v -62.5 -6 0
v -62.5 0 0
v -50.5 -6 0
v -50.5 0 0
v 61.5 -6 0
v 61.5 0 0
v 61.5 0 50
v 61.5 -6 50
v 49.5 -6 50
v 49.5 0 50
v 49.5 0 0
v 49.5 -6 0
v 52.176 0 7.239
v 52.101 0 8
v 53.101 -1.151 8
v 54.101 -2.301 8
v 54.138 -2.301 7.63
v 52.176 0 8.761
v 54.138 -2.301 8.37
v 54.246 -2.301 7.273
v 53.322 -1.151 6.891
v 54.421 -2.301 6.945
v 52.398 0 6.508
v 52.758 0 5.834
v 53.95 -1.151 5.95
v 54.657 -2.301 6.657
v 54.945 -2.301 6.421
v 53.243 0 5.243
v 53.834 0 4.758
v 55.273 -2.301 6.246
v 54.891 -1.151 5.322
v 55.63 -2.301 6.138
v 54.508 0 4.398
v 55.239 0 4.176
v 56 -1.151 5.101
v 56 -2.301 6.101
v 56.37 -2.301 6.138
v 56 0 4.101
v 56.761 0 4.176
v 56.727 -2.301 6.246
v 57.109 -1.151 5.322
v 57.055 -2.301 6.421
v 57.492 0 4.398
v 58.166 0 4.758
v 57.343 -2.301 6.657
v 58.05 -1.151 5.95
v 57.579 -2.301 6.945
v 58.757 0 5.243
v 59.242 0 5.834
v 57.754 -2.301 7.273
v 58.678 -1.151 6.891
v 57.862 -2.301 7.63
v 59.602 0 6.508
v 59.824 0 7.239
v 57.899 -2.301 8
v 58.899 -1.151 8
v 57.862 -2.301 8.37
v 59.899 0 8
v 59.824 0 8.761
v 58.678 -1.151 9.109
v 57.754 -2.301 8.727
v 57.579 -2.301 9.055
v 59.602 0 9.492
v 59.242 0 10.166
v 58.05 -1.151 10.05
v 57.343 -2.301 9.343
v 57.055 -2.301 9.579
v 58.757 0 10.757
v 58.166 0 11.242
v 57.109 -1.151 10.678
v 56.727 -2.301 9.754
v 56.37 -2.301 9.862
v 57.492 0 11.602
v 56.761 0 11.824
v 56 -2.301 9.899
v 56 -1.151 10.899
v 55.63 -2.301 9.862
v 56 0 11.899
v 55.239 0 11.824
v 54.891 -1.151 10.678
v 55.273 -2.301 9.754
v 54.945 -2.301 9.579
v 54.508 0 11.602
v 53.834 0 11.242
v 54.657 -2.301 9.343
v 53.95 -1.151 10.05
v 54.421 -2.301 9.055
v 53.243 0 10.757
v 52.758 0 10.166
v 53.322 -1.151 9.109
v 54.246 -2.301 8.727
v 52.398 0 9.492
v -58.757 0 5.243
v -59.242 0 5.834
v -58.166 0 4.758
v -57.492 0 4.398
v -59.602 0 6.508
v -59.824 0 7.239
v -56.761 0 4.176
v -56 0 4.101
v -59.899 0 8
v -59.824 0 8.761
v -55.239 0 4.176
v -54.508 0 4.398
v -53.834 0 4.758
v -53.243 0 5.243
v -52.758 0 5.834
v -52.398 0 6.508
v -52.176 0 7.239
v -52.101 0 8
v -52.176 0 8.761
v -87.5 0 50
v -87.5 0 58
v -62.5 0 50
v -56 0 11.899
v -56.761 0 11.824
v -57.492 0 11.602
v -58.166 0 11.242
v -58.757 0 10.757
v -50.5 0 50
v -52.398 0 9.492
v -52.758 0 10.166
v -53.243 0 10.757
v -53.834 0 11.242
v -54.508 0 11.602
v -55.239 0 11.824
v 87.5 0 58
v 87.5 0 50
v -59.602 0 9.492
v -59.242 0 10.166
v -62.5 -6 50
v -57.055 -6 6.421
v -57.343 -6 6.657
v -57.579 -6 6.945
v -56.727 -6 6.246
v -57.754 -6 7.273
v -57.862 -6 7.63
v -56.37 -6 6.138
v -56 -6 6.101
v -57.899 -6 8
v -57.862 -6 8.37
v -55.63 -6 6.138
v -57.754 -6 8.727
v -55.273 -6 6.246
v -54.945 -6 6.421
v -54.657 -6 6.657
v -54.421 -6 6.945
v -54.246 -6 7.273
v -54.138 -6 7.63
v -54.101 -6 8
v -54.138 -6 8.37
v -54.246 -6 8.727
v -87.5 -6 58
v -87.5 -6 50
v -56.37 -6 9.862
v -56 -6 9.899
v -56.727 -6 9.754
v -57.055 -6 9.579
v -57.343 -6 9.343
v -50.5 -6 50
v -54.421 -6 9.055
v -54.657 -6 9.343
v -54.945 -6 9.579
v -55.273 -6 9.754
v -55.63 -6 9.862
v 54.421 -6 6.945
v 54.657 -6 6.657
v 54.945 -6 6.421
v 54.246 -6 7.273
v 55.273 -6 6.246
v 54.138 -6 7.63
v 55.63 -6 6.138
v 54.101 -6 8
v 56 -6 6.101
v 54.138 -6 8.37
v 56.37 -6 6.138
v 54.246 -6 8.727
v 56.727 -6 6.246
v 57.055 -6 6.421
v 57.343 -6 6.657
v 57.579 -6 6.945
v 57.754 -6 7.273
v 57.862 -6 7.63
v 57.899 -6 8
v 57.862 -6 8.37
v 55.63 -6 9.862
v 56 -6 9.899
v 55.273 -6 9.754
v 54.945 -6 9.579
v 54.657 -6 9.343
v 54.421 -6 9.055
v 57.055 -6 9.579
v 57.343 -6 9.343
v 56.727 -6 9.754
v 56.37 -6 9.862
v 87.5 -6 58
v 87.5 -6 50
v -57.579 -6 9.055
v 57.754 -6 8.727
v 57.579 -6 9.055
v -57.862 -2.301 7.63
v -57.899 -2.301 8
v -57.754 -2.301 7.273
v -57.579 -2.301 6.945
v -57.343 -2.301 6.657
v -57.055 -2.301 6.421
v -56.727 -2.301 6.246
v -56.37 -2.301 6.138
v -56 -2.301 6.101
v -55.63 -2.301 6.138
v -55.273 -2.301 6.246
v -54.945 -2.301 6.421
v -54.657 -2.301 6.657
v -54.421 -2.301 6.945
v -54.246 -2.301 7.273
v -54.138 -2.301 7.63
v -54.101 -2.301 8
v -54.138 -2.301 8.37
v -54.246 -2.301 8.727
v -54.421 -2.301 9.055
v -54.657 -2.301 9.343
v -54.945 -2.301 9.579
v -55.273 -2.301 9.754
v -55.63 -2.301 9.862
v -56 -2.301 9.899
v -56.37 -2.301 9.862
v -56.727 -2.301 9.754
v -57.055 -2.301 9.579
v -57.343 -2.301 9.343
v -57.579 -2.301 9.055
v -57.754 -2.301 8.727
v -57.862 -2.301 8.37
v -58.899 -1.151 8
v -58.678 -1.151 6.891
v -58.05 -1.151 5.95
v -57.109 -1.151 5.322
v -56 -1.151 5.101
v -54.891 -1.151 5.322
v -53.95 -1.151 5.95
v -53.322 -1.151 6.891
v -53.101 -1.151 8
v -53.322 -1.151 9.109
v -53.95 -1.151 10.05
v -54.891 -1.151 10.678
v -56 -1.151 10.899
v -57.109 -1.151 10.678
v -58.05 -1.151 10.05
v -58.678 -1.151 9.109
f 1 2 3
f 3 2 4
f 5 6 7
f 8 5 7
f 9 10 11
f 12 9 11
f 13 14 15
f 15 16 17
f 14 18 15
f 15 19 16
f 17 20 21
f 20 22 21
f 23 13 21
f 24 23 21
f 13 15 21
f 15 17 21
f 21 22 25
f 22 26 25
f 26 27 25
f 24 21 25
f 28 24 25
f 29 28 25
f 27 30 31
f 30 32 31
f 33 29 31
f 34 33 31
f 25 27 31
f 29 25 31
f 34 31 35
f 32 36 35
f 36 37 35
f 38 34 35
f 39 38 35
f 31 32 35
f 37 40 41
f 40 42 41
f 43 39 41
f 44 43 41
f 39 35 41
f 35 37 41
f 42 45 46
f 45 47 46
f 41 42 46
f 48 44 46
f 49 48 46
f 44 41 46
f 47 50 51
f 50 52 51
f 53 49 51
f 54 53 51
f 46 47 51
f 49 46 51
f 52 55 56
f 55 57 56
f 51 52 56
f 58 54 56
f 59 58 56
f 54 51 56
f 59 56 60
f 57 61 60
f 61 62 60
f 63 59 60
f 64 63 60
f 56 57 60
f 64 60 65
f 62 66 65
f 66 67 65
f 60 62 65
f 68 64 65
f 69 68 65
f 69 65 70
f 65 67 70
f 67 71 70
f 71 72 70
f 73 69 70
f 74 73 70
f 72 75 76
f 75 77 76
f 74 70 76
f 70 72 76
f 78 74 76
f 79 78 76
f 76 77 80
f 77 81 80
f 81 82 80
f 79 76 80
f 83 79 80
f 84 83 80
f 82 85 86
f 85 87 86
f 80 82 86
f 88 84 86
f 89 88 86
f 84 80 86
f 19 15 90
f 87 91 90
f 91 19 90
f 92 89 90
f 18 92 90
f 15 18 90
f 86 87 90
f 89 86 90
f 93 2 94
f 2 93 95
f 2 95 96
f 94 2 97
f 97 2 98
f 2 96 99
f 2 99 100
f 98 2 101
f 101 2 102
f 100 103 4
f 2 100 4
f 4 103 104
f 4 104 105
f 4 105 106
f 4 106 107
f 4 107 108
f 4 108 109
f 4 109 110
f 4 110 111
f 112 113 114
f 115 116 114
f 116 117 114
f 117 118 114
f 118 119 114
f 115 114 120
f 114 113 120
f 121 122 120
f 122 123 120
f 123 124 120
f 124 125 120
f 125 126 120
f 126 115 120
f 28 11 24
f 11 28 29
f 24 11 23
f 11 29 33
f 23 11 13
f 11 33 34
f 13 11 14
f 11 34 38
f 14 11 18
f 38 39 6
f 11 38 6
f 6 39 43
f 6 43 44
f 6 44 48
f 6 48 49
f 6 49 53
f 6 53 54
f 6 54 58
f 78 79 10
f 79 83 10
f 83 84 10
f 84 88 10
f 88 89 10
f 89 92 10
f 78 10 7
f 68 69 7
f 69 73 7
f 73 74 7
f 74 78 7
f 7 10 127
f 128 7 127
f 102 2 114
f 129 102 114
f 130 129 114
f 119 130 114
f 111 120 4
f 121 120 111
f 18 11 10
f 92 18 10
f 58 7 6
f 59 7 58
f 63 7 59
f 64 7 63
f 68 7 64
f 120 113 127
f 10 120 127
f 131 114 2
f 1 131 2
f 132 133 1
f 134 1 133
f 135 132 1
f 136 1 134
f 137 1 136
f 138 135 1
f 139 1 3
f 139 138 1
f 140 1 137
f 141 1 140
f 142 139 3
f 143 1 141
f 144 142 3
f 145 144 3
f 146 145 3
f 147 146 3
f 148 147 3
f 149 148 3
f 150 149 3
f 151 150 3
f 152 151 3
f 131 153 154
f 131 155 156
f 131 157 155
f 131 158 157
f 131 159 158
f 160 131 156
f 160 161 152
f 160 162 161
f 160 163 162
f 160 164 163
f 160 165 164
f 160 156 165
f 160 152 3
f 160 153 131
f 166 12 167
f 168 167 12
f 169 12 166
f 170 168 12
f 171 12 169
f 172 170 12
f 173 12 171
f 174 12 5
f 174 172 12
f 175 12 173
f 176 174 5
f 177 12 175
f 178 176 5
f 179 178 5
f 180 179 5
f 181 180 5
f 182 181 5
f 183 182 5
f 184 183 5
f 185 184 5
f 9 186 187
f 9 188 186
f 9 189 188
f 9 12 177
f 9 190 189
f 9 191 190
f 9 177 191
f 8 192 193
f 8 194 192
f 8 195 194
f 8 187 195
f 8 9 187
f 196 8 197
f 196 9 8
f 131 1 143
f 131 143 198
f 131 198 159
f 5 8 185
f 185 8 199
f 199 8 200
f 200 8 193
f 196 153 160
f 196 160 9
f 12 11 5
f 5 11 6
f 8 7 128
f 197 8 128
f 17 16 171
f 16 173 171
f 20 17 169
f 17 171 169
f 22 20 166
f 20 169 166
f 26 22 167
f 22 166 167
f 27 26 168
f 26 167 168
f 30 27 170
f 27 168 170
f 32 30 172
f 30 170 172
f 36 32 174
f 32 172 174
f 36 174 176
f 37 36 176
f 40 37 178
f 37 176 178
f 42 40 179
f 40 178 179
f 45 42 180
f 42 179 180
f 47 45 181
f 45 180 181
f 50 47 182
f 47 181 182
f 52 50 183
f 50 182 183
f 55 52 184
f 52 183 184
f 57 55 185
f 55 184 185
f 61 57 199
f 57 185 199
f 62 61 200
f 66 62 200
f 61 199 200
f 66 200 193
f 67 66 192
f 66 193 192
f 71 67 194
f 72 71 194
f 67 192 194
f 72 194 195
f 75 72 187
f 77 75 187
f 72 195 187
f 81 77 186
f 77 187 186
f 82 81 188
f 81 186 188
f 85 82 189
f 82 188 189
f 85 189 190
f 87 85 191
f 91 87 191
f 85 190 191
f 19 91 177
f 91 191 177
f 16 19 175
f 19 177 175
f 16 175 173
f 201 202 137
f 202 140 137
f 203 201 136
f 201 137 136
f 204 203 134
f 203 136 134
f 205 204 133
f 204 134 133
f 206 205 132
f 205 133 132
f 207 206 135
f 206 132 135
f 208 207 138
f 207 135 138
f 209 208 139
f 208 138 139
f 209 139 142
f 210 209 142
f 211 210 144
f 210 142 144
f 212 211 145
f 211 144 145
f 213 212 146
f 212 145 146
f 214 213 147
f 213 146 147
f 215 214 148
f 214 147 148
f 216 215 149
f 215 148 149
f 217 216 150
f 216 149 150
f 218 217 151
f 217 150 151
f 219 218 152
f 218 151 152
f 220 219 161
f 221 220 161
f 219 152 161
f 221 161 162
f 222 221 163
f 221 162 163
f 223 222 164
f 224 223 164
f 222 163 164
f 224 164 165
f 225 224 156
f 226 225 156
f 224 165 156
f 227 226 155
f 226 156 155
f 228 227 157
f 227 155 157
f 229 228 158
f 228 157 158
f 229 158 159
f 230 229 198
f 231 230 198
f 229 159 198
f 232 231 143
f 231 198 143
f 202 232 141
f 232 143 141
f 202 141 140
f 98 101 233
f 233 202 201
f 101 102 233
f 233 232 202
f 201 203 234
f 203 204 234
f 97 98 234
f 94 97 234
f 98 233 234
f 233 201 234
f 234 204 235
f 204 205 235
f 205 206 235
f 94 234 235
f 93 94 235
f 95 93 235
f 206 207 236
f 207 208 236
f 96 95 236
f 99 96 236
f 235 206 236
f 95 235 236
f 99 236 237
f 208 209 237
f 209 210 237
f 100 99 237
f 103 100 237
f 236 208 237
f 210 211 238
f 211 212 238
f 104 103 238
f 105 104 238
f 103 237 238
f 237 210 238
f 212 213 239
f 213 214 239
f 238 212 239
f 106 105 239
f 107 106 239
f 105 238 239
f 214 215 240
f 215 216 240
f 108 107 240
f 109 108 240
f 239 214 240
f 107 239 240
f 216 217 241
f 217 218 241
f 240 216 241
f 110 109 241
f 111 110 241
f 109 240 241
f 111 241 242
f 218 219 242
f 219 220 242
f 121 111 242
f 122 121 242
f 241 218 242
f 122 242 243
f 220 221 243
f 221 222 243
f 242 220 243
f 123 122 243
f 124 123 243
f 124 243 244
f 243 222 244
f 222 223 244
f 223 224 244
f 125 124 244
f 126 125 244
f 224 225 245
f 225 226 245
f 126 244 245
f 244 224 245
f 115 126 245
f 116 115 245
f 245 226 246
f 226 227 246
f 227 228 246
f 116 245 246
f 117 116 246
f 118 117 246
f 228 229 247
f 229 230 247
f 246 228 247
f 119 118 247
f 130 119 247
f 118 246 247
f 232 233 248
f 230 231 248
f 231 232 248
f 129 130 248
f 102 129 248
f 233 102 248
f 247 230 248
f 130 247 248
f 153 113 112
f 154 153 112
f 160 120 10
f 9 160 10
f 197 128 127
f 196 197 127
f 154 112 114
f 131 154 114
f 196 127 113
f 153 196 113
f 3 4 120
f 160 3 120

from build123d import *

# Parameters (mm, degrees)
F1_DEPTH       = 6
F2_D           = 3.7973
F2_CSINK_D     = 7.7978
F2_CSINK_ANGLE = 82


with BuildPart() as f1:
    # F0 (on Front) → F1 (new body)
    with BuildSketch(Plane.XZ):
        Polygon((-87.5, 58), (-87.5, 50), (-62.5, 50), (-62.5, 0), (-50.5, 0), (-50.5, 50), (49.5, 50), (49.5, 0), (61.5, 0), (61.5, 50), (87.5, 50), (87.5, 58), align=None)
    extrude(amount=F1_DEPTH)

    # F2 (through all)
    with Locations(Plane(origin=(0, 0, 0), x_dir=(1, 0, 0), z_dir=(0, 1, 0))):
        with Locations((-56, -8), (56, -8)):
            CounterSinkHole(F2_D / 2, F2_CSINK_D / 2, counter_sink_angle=F2_CSINK_ANGLE)


solid = f1.part
